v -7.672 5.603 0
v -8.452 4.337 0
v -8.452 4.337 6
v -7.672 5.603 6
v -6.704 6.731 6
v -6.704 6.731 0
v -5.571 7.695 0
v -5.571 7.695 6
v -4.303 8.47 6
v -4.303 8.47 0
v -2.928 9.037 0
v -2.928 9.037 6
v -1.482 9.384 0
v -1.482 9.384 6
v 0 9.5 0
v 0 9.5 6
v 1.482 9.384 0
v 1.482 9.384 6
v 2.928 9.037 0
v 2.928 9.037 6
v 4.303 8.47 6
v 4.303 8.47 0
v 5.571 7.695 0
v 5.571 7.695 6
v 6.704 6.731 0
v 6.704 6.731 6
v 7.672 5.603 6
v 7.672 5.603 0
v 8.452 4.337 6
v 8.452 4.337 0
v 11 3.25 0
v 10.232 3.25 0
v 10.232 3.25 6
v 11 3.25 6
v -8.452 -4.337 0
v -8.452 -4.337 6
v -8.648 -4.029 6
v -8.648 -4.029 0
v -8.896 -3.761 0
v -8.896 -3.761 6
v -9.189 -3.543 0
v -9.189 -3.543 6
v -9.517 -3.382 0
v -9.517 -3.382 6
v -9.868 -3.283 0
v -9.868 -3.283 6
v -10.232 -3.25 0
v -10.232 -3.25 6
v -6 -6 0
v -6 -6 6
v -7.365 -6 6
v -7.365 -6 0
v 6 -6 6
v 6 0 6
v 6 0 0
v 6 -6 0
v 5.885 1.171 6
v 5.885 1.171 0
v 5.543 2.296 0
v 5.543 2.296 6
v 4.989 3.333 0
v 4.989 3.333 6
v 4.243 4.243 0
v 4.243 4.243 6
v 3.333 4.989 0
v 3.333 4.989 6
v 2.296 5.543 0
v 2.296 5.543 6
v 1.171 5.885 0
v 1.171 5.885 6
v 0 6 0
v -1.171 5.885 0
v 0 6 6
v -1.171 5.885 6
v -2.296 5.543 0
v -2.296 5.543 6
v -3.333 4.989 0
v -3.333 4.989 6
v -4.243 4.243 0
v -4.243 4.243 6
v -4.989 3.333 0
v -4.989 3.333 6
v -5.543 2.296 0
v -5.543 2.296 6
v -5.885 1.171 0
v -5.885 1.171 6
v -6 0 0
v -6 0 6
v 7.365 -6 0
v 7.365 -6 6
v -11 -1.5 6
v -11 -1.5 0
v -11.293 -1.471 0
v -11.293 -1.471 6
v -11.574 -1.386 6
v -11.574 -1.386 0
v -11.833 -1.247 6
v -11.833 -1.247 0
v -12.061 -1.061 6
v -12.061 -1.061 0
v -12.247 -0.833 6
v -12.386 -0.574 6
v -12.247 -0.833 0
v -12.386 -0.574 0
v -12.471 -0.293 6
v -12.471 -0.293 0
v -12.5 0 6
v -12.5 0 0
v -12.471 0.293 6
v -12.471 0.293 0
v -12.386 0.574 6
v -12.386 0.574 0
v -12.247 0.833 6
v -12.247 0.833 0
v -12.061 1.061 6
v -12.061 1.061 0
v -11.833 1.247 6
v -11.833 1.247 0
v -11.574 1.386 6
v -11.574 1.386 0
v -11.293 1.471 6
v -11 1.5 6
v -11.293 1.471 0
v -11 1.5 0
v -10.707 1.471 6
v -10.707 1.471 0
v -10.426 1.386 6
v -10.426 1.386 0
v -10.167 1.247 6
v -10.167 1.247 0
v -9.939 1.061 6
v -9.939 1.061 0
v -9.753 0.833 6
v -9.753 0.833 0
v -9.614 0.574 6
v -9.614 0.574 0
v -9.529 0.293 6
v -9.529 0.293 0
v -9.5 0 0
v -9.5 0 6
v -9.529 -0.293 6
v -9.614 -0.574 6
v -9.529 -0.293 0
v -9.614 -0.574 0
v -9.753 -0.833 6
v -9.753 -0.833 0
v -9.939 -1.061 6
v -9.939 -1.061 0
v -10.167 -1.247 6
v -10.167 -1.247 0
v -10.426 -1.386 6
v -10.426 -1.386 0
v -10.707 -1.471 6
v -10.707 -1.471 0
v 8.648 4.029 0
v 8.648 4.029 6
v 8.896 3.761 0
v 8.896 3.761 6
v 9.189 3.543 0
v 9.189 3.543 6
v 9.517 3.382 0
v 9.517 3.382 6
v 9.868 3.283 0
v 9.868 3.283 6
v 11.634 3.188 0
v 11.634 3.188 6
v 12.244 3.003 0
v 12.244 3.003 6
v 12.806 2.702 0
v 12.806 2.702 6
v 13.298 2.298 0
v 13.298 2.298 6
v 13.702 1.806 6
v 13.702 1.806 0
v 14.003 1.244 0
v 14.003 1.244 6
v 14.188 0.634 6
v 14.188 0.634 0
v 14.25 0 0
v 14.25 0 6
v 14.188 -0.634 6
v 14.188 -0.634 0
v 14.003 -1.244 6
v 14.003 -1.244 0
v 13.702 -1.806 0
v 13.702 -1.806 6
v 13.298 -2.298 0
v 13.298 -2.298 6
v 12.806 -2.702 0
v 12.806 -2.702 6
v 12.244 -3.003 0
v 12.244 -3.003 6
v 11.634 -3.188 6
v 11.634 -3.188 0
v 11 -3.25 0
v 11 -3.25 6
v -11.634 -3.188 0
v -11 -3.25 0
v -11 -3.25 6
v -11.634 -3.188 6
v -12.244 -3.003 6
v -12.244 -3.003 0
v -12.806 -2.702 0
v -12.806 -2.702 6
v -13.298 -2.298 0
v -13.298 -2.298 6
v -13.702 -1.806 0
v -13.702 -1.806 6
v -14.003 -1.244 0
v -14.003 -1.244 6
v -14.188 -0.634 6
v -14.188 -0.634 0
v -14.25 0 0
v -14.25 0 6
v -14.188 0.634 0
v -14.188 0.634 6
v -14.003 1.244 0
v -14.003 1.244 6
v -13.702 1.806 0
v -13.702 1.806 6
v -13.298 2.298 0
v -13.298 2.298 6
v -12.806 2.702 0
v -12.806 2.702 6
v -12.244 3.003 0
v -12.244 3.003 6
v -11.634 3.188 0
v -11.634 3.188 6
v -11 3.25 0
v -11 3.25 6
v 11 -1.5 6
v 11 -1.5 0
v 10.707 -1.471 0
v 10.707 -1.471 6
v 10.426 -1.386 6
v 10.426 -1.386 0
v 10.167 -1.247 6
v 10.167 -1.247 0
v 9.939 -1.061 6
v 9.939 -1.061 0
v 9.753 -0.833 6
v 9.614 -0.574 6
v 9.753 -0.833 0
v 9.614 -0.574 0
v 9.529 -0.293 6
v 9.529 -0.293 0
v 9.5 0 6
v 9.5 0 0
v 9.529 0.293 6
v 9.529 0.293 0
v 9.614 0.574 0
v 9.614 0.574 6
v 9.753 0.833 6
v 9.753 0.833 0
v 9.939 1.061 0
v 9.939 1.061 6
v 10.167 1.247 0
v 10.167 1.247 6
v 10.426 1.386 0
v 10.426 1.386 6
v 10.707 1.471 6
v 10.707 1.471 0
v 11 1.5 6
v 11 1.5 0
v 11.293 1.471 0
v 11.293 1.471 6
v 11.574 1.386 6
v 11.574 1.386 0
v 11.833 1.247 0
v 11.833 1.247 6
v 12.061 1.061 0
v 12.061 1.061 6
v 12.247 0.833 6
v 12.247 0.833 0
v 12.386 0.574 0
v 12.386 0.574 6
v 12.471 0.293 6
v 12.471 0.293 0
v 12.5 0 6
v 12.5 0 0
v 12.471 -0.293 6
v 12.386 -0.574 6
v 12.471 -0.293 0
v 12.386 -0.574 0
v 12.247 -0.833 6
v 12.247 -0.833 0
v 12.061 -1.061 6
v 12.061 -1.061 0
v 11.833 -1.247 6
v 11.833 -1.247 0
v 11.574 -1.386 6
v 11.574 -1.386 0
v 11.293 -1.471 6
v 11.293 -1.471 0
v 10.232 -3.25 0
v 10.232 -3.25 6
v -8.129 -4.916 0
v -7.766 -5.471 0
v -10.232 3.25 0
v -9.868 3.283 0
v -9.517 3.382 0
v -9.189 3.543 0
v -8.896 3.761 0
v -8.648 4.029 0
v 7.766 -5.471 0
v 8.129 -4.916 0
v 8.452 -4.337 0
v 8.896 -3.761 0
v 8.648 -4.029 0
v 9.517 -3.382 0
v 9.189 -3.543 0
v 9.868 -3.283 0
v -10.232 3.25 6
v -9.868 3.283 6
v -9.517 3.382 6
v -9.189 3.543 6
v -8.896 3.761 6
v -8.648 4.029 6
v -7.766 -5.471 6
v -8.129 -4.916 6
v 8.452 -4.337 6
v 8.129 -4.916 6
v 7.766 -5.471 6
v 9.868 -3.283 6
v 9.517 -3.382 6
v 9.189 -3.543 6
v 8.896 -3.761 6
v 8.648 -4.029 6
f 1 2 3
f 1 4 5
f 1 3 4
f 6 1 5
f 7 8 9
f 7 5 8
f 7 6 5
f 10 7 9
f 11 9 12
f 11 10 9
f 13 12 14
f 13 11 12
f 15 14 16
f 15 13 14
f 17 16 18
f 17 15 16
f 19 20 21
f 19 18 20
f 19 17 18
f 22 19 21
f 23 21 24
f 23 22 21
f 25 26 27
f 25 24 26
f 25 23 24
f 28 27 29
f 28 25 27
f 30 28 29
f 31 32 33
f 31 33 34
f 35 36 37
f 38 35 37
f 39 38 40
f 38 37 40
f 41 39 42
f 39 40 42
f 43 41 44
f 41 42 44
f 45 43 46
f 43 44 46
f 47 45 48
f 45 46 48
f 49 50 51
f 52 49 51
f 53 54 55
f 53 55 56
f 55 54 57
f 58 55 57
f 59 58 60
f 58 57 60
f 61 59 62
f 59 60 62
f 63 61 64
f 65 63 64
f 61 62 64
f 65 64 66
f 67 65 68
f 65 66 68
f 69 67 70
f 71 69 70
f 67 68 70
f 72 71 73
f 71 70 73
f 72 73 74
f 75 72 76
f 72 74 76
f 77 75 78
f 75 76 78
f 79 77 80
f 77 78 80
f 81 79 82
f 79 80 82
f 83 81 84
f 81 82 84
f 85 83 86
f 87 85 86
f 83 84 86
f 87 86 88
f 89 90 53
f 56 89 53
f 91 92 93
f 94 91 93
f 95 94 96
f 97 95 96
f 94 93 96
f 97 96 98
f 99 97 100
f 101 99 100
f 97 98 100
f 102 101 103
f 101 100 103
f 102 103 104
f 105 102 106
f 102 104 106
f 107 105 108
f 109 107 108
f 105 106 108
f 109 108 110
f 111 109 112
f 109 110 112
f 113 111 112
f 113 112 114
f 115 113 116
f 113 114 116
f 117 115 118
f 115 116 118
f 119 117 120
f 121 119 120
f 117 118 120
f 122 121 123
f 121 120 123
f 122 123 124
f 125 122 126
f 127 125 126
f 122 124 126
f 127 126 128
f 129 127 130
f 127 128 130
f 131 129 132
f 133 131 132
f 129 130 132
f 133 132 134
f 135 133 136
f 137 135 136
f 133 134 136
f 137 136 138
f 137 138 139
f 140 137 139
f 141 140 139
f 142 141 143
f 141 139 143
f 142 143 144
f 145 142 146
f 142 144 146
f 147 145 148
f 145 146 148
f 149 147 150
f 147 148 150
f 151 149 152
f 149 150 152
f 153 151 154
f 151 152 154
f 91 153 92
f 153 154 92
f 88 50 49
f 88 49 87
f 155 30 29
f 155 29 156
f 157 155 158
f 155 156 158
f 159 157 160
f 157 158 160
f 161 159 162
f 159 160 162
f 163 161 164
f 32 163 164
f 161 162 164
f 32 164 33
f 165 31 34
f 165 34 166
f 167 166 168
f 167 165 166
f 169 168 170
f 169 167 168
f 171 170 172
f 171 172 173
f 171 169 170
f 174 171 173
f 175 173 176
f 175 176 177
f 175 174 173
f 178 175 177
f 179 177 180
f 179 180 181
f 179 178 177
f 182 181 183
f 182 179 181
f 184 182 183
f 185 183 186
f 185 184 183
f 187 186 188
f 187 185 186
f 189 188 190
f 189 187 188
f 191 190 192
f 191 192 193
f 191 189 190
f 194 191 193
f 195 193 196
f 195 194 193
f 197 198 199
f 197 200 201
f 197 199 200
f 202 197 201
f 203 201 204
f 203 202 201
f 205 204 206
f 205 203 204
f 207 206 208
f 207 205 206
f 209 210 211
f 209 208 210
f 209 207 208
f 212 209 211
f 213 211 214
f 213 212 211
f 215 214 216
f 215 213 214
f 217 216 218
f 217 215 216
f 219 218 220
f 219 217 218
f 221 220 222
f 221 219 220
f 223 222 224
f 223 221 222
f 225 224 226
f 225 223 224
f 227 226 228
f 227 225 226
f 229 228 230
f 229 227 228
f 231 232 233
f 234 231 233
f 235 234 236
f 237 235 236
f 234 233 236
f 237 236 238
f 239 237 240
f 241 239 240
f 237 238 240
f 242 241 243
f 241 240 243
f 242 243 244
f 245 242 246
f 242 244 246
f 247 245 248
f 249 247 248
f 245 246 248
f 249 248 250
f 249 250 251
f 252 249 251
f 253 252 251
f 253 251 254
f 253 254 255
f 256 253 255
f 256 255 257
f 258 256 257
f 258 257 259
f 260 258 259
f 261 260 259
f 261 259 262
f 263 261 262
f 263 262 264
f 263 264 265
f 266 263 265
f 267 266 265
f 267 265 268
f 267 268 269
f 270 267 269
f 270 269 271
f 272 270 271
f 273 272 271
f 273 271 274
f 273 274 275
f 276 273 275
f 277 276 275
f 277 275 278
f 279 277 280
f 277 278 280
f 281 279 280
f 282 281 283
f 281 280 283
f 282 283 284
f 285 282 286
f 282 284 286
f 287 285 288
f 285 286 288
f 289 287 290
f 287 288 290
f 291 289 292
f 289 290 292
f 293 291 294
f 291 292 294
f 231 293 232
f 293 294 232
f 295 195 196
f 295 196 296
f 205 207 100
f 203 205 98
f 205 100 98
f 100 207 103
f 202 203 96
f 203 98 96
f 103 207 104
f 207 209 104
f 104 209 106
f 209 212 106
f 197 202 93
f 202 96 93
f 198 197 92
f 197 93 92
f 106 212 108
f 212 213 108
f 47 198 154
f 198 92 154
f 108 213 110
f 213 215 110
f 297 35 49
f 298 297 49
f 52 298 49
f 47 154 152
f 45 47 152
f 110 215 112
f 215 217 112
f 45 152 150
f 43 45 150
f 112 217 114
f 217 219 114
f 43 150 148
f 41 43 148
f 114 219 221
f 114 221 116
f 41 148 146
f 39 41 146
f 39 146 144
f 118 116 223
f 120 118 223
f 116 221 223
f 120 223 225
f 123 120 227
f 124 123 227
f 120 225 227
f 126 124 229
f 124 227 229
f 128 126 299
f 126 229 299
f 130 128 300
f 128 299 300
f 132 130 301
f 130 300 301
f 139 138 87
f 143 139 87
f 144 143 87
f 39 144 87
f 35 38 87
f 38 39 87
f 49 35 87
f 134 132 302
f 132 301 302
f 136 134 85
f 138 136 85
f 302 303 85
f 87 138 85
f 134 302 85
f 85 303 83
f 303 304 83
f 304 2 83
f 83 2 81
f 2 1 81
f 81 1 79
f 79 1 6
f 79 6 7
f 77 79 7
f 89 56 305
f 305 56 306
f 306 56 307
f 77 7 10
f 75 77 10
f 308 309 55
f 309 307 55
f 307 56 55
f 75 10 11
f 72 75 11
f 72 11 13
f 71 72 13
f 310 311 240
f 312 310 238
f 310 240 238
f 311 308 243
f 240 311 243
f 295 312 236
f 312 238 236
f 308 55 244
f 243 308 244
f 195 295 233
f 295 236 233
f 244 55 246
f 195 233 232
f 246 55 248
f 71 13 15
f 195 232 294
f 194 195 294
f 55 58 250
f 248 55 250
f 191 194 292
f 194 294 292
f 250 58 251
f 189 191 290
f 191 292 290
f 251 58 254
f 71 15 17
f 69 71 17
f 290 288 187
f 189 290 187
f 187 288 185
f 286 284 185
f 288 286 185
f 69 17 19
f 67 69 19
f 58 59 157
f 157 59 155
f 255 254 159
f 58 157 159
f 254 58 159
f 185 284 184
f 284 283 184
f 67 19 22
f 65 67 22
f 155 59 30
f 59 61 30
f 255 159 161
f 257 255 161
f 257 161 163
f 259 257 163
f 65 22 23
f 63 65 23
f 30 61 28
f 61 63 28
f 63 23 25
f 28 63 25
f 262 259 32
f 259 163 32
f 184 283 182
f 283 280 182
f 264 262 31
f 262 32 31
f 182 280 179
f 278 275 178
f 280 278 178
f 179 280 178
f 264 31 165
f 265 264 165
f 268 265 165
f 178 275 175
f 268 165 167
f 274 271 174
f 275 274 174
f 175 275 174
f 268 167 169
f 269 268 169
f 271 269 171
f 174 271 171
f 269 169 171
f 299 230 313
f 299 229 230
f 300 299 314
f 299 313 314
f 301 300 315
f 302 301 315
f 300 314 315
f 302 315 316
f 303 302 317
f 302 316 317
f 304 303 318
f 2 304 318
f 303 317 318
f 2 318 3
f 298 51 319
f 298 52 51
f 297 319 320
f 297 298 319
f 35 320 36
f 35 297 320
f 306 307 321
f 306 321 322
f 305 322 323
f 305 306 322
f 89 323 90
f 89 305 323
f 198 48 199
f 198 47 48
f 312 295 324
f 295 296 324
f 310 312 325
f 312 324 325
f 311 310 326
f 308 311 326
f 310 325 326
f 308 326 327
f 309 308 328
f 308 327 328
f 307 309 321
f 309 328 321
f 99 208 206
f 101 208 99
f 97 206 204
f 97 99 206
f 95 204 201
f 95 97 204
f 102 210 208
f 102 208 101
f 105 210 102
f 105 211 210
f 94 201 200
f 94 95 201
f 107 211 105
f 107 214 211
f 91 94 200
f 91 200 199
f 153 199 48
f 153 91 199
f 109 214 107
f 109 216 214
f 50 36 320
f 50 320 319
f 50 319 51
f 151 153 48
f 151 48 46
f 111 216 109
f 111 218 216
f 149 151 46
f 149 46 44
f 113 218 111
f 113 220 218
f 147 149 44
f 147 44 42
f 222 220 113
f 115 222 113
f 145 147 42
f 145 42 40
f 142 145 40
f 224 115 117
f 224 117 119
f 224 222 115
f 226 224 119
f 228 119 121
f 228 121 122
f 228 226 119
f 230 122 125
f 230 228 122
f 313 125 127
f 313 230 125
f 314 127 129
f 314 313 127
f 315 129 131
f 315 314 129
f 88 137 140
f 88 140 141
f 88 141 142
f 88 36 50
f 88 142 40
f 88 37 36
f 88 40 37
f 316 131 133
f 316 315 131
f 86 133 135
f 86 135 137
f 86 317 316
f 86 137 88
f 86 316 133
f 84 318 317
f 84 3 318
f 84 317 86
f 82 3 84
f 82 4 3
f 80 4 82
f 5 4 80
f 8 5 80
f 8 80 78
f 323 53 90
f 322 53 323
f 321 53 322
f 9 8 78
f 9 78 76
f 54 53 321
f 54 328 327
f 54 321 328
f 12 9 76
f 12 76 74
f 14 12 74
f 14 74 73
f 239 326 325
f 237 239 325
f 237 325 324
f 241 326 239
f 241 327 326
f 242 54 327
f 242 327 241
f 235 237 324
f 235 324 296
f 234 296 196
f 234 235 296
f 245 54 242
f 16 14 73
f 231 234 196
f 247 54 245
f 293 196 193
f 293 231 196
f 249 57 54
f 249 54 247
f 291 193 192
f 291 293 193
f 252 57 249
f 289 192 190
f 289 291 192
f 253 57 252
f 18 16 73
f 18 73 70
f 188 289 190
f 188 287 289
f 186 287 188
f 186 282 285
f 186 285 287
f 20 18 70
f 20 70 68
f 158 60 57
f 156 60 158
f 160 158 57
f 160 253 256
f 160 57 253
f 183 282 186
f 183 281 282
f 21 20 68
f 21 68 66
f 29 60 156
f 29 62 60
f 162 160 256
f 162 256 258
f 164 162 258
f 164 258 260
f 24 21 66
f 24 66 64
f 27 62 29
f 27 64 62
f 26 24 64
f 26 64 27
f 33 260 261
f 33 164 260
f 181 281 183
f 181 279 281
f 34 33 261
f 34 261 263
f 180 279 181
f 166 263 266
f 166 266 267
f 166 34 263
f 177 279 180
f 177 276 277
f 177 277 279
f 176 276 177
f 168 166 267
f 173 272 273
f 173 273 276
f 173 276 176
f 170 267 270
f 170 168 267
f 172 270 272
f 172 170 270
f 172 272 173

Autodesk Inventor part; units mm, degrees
ref_plane "YZ Plane" through (0, 0, 0) normal (1, 0, 0) x (0, 1, 0)
ref_plane "XZ Plane" through (0, 0, 0) normal (0, 1, 0) x (-1, 0, 0)
ref_plane "XY Plane" through (0, 0, 0) normal (0, 0, 1) x (1, 0, 0)
sketch "Sketch1" plane through (0, 0, 0) normal (0, 0, 1) x (1, 0, 0)
  circle A0 centre (0, 0) radius 9.5
  circle A1 centre (-11, 0) radius 3.25
  circle A2 centre (11, 0) radius 3.25
  line L0 (-11, 3.25) -> (11, 3.25)
  line L1 (11, 3.25) -> (11, -3.25)
  line L2 (11, -3.25) -> (-11, -3.25)
  line L3 (-11, -3.25) -> (-11, 3.25)
  dimension "d15" = 6.5
  dimension "d17" = 6.5
  dimension "d12" = 19
  dimension "d16" = 11
  dimension "d18" = 11
extrude "Extrusion1" add sketch "Sketch1" along normal blind 6
sketch "草圖4" plane through (0, 0, 6) normal (0, 0, 1) x (1, 0, 0)
  arc A0 (-8.9268, -3.25) -> (8.9268, -3.25) centre (0, 0) ccw projected
  circle A1 centre (0, 0) radius 6
  line L0 (-6, 0) -> (6, 0)
  line L1 (6, 0) -> (6, -9.5)
  line L2 (6, -9.5) -> (-6, -9.5)
  line L3 (-6, -9.5) -> (-6, 0)
  line L4 (-8, -9.5) -> (8, -9.5)
  line L5 (8, -9.5) -> (8, -6)
  line L6 (8, -6) -> (-8, -6)
  line L7 (-8, -6) -> (-8, -9.5)
  dimension "d19" = 12
  dimension "d23" = 6
  dimension "d24" = 3.5
  dimension "d26" = 16
  dimension "d27" = 8
extrude "擠出2" cut sketch "草圖4" against normal through all
fillet "圓角2" radius 2 4 edges at (8.9268, -3.25, 3) (-8.9268, -3.25, 3) (8.9268, 3.25, 3) (-8.9268, 3.25, 3)
sketch "草圖5" plane through (0, 0, 6) normal (0, 0, 1) x (1, 0, 0)
  arc A0 (14.25, 0) -> (11, 3.25) centre (11, 0) ccw projected
  arc A1 (-11, 3.25) -> (-11, -3.25) centre (-11, 0) ccw projected
hole "孔2" at (-11, 0, 6) at (11, 0, 6) direction (0, 0, -1) diameter 3 end through all
properties part number "plastic_part_13"
